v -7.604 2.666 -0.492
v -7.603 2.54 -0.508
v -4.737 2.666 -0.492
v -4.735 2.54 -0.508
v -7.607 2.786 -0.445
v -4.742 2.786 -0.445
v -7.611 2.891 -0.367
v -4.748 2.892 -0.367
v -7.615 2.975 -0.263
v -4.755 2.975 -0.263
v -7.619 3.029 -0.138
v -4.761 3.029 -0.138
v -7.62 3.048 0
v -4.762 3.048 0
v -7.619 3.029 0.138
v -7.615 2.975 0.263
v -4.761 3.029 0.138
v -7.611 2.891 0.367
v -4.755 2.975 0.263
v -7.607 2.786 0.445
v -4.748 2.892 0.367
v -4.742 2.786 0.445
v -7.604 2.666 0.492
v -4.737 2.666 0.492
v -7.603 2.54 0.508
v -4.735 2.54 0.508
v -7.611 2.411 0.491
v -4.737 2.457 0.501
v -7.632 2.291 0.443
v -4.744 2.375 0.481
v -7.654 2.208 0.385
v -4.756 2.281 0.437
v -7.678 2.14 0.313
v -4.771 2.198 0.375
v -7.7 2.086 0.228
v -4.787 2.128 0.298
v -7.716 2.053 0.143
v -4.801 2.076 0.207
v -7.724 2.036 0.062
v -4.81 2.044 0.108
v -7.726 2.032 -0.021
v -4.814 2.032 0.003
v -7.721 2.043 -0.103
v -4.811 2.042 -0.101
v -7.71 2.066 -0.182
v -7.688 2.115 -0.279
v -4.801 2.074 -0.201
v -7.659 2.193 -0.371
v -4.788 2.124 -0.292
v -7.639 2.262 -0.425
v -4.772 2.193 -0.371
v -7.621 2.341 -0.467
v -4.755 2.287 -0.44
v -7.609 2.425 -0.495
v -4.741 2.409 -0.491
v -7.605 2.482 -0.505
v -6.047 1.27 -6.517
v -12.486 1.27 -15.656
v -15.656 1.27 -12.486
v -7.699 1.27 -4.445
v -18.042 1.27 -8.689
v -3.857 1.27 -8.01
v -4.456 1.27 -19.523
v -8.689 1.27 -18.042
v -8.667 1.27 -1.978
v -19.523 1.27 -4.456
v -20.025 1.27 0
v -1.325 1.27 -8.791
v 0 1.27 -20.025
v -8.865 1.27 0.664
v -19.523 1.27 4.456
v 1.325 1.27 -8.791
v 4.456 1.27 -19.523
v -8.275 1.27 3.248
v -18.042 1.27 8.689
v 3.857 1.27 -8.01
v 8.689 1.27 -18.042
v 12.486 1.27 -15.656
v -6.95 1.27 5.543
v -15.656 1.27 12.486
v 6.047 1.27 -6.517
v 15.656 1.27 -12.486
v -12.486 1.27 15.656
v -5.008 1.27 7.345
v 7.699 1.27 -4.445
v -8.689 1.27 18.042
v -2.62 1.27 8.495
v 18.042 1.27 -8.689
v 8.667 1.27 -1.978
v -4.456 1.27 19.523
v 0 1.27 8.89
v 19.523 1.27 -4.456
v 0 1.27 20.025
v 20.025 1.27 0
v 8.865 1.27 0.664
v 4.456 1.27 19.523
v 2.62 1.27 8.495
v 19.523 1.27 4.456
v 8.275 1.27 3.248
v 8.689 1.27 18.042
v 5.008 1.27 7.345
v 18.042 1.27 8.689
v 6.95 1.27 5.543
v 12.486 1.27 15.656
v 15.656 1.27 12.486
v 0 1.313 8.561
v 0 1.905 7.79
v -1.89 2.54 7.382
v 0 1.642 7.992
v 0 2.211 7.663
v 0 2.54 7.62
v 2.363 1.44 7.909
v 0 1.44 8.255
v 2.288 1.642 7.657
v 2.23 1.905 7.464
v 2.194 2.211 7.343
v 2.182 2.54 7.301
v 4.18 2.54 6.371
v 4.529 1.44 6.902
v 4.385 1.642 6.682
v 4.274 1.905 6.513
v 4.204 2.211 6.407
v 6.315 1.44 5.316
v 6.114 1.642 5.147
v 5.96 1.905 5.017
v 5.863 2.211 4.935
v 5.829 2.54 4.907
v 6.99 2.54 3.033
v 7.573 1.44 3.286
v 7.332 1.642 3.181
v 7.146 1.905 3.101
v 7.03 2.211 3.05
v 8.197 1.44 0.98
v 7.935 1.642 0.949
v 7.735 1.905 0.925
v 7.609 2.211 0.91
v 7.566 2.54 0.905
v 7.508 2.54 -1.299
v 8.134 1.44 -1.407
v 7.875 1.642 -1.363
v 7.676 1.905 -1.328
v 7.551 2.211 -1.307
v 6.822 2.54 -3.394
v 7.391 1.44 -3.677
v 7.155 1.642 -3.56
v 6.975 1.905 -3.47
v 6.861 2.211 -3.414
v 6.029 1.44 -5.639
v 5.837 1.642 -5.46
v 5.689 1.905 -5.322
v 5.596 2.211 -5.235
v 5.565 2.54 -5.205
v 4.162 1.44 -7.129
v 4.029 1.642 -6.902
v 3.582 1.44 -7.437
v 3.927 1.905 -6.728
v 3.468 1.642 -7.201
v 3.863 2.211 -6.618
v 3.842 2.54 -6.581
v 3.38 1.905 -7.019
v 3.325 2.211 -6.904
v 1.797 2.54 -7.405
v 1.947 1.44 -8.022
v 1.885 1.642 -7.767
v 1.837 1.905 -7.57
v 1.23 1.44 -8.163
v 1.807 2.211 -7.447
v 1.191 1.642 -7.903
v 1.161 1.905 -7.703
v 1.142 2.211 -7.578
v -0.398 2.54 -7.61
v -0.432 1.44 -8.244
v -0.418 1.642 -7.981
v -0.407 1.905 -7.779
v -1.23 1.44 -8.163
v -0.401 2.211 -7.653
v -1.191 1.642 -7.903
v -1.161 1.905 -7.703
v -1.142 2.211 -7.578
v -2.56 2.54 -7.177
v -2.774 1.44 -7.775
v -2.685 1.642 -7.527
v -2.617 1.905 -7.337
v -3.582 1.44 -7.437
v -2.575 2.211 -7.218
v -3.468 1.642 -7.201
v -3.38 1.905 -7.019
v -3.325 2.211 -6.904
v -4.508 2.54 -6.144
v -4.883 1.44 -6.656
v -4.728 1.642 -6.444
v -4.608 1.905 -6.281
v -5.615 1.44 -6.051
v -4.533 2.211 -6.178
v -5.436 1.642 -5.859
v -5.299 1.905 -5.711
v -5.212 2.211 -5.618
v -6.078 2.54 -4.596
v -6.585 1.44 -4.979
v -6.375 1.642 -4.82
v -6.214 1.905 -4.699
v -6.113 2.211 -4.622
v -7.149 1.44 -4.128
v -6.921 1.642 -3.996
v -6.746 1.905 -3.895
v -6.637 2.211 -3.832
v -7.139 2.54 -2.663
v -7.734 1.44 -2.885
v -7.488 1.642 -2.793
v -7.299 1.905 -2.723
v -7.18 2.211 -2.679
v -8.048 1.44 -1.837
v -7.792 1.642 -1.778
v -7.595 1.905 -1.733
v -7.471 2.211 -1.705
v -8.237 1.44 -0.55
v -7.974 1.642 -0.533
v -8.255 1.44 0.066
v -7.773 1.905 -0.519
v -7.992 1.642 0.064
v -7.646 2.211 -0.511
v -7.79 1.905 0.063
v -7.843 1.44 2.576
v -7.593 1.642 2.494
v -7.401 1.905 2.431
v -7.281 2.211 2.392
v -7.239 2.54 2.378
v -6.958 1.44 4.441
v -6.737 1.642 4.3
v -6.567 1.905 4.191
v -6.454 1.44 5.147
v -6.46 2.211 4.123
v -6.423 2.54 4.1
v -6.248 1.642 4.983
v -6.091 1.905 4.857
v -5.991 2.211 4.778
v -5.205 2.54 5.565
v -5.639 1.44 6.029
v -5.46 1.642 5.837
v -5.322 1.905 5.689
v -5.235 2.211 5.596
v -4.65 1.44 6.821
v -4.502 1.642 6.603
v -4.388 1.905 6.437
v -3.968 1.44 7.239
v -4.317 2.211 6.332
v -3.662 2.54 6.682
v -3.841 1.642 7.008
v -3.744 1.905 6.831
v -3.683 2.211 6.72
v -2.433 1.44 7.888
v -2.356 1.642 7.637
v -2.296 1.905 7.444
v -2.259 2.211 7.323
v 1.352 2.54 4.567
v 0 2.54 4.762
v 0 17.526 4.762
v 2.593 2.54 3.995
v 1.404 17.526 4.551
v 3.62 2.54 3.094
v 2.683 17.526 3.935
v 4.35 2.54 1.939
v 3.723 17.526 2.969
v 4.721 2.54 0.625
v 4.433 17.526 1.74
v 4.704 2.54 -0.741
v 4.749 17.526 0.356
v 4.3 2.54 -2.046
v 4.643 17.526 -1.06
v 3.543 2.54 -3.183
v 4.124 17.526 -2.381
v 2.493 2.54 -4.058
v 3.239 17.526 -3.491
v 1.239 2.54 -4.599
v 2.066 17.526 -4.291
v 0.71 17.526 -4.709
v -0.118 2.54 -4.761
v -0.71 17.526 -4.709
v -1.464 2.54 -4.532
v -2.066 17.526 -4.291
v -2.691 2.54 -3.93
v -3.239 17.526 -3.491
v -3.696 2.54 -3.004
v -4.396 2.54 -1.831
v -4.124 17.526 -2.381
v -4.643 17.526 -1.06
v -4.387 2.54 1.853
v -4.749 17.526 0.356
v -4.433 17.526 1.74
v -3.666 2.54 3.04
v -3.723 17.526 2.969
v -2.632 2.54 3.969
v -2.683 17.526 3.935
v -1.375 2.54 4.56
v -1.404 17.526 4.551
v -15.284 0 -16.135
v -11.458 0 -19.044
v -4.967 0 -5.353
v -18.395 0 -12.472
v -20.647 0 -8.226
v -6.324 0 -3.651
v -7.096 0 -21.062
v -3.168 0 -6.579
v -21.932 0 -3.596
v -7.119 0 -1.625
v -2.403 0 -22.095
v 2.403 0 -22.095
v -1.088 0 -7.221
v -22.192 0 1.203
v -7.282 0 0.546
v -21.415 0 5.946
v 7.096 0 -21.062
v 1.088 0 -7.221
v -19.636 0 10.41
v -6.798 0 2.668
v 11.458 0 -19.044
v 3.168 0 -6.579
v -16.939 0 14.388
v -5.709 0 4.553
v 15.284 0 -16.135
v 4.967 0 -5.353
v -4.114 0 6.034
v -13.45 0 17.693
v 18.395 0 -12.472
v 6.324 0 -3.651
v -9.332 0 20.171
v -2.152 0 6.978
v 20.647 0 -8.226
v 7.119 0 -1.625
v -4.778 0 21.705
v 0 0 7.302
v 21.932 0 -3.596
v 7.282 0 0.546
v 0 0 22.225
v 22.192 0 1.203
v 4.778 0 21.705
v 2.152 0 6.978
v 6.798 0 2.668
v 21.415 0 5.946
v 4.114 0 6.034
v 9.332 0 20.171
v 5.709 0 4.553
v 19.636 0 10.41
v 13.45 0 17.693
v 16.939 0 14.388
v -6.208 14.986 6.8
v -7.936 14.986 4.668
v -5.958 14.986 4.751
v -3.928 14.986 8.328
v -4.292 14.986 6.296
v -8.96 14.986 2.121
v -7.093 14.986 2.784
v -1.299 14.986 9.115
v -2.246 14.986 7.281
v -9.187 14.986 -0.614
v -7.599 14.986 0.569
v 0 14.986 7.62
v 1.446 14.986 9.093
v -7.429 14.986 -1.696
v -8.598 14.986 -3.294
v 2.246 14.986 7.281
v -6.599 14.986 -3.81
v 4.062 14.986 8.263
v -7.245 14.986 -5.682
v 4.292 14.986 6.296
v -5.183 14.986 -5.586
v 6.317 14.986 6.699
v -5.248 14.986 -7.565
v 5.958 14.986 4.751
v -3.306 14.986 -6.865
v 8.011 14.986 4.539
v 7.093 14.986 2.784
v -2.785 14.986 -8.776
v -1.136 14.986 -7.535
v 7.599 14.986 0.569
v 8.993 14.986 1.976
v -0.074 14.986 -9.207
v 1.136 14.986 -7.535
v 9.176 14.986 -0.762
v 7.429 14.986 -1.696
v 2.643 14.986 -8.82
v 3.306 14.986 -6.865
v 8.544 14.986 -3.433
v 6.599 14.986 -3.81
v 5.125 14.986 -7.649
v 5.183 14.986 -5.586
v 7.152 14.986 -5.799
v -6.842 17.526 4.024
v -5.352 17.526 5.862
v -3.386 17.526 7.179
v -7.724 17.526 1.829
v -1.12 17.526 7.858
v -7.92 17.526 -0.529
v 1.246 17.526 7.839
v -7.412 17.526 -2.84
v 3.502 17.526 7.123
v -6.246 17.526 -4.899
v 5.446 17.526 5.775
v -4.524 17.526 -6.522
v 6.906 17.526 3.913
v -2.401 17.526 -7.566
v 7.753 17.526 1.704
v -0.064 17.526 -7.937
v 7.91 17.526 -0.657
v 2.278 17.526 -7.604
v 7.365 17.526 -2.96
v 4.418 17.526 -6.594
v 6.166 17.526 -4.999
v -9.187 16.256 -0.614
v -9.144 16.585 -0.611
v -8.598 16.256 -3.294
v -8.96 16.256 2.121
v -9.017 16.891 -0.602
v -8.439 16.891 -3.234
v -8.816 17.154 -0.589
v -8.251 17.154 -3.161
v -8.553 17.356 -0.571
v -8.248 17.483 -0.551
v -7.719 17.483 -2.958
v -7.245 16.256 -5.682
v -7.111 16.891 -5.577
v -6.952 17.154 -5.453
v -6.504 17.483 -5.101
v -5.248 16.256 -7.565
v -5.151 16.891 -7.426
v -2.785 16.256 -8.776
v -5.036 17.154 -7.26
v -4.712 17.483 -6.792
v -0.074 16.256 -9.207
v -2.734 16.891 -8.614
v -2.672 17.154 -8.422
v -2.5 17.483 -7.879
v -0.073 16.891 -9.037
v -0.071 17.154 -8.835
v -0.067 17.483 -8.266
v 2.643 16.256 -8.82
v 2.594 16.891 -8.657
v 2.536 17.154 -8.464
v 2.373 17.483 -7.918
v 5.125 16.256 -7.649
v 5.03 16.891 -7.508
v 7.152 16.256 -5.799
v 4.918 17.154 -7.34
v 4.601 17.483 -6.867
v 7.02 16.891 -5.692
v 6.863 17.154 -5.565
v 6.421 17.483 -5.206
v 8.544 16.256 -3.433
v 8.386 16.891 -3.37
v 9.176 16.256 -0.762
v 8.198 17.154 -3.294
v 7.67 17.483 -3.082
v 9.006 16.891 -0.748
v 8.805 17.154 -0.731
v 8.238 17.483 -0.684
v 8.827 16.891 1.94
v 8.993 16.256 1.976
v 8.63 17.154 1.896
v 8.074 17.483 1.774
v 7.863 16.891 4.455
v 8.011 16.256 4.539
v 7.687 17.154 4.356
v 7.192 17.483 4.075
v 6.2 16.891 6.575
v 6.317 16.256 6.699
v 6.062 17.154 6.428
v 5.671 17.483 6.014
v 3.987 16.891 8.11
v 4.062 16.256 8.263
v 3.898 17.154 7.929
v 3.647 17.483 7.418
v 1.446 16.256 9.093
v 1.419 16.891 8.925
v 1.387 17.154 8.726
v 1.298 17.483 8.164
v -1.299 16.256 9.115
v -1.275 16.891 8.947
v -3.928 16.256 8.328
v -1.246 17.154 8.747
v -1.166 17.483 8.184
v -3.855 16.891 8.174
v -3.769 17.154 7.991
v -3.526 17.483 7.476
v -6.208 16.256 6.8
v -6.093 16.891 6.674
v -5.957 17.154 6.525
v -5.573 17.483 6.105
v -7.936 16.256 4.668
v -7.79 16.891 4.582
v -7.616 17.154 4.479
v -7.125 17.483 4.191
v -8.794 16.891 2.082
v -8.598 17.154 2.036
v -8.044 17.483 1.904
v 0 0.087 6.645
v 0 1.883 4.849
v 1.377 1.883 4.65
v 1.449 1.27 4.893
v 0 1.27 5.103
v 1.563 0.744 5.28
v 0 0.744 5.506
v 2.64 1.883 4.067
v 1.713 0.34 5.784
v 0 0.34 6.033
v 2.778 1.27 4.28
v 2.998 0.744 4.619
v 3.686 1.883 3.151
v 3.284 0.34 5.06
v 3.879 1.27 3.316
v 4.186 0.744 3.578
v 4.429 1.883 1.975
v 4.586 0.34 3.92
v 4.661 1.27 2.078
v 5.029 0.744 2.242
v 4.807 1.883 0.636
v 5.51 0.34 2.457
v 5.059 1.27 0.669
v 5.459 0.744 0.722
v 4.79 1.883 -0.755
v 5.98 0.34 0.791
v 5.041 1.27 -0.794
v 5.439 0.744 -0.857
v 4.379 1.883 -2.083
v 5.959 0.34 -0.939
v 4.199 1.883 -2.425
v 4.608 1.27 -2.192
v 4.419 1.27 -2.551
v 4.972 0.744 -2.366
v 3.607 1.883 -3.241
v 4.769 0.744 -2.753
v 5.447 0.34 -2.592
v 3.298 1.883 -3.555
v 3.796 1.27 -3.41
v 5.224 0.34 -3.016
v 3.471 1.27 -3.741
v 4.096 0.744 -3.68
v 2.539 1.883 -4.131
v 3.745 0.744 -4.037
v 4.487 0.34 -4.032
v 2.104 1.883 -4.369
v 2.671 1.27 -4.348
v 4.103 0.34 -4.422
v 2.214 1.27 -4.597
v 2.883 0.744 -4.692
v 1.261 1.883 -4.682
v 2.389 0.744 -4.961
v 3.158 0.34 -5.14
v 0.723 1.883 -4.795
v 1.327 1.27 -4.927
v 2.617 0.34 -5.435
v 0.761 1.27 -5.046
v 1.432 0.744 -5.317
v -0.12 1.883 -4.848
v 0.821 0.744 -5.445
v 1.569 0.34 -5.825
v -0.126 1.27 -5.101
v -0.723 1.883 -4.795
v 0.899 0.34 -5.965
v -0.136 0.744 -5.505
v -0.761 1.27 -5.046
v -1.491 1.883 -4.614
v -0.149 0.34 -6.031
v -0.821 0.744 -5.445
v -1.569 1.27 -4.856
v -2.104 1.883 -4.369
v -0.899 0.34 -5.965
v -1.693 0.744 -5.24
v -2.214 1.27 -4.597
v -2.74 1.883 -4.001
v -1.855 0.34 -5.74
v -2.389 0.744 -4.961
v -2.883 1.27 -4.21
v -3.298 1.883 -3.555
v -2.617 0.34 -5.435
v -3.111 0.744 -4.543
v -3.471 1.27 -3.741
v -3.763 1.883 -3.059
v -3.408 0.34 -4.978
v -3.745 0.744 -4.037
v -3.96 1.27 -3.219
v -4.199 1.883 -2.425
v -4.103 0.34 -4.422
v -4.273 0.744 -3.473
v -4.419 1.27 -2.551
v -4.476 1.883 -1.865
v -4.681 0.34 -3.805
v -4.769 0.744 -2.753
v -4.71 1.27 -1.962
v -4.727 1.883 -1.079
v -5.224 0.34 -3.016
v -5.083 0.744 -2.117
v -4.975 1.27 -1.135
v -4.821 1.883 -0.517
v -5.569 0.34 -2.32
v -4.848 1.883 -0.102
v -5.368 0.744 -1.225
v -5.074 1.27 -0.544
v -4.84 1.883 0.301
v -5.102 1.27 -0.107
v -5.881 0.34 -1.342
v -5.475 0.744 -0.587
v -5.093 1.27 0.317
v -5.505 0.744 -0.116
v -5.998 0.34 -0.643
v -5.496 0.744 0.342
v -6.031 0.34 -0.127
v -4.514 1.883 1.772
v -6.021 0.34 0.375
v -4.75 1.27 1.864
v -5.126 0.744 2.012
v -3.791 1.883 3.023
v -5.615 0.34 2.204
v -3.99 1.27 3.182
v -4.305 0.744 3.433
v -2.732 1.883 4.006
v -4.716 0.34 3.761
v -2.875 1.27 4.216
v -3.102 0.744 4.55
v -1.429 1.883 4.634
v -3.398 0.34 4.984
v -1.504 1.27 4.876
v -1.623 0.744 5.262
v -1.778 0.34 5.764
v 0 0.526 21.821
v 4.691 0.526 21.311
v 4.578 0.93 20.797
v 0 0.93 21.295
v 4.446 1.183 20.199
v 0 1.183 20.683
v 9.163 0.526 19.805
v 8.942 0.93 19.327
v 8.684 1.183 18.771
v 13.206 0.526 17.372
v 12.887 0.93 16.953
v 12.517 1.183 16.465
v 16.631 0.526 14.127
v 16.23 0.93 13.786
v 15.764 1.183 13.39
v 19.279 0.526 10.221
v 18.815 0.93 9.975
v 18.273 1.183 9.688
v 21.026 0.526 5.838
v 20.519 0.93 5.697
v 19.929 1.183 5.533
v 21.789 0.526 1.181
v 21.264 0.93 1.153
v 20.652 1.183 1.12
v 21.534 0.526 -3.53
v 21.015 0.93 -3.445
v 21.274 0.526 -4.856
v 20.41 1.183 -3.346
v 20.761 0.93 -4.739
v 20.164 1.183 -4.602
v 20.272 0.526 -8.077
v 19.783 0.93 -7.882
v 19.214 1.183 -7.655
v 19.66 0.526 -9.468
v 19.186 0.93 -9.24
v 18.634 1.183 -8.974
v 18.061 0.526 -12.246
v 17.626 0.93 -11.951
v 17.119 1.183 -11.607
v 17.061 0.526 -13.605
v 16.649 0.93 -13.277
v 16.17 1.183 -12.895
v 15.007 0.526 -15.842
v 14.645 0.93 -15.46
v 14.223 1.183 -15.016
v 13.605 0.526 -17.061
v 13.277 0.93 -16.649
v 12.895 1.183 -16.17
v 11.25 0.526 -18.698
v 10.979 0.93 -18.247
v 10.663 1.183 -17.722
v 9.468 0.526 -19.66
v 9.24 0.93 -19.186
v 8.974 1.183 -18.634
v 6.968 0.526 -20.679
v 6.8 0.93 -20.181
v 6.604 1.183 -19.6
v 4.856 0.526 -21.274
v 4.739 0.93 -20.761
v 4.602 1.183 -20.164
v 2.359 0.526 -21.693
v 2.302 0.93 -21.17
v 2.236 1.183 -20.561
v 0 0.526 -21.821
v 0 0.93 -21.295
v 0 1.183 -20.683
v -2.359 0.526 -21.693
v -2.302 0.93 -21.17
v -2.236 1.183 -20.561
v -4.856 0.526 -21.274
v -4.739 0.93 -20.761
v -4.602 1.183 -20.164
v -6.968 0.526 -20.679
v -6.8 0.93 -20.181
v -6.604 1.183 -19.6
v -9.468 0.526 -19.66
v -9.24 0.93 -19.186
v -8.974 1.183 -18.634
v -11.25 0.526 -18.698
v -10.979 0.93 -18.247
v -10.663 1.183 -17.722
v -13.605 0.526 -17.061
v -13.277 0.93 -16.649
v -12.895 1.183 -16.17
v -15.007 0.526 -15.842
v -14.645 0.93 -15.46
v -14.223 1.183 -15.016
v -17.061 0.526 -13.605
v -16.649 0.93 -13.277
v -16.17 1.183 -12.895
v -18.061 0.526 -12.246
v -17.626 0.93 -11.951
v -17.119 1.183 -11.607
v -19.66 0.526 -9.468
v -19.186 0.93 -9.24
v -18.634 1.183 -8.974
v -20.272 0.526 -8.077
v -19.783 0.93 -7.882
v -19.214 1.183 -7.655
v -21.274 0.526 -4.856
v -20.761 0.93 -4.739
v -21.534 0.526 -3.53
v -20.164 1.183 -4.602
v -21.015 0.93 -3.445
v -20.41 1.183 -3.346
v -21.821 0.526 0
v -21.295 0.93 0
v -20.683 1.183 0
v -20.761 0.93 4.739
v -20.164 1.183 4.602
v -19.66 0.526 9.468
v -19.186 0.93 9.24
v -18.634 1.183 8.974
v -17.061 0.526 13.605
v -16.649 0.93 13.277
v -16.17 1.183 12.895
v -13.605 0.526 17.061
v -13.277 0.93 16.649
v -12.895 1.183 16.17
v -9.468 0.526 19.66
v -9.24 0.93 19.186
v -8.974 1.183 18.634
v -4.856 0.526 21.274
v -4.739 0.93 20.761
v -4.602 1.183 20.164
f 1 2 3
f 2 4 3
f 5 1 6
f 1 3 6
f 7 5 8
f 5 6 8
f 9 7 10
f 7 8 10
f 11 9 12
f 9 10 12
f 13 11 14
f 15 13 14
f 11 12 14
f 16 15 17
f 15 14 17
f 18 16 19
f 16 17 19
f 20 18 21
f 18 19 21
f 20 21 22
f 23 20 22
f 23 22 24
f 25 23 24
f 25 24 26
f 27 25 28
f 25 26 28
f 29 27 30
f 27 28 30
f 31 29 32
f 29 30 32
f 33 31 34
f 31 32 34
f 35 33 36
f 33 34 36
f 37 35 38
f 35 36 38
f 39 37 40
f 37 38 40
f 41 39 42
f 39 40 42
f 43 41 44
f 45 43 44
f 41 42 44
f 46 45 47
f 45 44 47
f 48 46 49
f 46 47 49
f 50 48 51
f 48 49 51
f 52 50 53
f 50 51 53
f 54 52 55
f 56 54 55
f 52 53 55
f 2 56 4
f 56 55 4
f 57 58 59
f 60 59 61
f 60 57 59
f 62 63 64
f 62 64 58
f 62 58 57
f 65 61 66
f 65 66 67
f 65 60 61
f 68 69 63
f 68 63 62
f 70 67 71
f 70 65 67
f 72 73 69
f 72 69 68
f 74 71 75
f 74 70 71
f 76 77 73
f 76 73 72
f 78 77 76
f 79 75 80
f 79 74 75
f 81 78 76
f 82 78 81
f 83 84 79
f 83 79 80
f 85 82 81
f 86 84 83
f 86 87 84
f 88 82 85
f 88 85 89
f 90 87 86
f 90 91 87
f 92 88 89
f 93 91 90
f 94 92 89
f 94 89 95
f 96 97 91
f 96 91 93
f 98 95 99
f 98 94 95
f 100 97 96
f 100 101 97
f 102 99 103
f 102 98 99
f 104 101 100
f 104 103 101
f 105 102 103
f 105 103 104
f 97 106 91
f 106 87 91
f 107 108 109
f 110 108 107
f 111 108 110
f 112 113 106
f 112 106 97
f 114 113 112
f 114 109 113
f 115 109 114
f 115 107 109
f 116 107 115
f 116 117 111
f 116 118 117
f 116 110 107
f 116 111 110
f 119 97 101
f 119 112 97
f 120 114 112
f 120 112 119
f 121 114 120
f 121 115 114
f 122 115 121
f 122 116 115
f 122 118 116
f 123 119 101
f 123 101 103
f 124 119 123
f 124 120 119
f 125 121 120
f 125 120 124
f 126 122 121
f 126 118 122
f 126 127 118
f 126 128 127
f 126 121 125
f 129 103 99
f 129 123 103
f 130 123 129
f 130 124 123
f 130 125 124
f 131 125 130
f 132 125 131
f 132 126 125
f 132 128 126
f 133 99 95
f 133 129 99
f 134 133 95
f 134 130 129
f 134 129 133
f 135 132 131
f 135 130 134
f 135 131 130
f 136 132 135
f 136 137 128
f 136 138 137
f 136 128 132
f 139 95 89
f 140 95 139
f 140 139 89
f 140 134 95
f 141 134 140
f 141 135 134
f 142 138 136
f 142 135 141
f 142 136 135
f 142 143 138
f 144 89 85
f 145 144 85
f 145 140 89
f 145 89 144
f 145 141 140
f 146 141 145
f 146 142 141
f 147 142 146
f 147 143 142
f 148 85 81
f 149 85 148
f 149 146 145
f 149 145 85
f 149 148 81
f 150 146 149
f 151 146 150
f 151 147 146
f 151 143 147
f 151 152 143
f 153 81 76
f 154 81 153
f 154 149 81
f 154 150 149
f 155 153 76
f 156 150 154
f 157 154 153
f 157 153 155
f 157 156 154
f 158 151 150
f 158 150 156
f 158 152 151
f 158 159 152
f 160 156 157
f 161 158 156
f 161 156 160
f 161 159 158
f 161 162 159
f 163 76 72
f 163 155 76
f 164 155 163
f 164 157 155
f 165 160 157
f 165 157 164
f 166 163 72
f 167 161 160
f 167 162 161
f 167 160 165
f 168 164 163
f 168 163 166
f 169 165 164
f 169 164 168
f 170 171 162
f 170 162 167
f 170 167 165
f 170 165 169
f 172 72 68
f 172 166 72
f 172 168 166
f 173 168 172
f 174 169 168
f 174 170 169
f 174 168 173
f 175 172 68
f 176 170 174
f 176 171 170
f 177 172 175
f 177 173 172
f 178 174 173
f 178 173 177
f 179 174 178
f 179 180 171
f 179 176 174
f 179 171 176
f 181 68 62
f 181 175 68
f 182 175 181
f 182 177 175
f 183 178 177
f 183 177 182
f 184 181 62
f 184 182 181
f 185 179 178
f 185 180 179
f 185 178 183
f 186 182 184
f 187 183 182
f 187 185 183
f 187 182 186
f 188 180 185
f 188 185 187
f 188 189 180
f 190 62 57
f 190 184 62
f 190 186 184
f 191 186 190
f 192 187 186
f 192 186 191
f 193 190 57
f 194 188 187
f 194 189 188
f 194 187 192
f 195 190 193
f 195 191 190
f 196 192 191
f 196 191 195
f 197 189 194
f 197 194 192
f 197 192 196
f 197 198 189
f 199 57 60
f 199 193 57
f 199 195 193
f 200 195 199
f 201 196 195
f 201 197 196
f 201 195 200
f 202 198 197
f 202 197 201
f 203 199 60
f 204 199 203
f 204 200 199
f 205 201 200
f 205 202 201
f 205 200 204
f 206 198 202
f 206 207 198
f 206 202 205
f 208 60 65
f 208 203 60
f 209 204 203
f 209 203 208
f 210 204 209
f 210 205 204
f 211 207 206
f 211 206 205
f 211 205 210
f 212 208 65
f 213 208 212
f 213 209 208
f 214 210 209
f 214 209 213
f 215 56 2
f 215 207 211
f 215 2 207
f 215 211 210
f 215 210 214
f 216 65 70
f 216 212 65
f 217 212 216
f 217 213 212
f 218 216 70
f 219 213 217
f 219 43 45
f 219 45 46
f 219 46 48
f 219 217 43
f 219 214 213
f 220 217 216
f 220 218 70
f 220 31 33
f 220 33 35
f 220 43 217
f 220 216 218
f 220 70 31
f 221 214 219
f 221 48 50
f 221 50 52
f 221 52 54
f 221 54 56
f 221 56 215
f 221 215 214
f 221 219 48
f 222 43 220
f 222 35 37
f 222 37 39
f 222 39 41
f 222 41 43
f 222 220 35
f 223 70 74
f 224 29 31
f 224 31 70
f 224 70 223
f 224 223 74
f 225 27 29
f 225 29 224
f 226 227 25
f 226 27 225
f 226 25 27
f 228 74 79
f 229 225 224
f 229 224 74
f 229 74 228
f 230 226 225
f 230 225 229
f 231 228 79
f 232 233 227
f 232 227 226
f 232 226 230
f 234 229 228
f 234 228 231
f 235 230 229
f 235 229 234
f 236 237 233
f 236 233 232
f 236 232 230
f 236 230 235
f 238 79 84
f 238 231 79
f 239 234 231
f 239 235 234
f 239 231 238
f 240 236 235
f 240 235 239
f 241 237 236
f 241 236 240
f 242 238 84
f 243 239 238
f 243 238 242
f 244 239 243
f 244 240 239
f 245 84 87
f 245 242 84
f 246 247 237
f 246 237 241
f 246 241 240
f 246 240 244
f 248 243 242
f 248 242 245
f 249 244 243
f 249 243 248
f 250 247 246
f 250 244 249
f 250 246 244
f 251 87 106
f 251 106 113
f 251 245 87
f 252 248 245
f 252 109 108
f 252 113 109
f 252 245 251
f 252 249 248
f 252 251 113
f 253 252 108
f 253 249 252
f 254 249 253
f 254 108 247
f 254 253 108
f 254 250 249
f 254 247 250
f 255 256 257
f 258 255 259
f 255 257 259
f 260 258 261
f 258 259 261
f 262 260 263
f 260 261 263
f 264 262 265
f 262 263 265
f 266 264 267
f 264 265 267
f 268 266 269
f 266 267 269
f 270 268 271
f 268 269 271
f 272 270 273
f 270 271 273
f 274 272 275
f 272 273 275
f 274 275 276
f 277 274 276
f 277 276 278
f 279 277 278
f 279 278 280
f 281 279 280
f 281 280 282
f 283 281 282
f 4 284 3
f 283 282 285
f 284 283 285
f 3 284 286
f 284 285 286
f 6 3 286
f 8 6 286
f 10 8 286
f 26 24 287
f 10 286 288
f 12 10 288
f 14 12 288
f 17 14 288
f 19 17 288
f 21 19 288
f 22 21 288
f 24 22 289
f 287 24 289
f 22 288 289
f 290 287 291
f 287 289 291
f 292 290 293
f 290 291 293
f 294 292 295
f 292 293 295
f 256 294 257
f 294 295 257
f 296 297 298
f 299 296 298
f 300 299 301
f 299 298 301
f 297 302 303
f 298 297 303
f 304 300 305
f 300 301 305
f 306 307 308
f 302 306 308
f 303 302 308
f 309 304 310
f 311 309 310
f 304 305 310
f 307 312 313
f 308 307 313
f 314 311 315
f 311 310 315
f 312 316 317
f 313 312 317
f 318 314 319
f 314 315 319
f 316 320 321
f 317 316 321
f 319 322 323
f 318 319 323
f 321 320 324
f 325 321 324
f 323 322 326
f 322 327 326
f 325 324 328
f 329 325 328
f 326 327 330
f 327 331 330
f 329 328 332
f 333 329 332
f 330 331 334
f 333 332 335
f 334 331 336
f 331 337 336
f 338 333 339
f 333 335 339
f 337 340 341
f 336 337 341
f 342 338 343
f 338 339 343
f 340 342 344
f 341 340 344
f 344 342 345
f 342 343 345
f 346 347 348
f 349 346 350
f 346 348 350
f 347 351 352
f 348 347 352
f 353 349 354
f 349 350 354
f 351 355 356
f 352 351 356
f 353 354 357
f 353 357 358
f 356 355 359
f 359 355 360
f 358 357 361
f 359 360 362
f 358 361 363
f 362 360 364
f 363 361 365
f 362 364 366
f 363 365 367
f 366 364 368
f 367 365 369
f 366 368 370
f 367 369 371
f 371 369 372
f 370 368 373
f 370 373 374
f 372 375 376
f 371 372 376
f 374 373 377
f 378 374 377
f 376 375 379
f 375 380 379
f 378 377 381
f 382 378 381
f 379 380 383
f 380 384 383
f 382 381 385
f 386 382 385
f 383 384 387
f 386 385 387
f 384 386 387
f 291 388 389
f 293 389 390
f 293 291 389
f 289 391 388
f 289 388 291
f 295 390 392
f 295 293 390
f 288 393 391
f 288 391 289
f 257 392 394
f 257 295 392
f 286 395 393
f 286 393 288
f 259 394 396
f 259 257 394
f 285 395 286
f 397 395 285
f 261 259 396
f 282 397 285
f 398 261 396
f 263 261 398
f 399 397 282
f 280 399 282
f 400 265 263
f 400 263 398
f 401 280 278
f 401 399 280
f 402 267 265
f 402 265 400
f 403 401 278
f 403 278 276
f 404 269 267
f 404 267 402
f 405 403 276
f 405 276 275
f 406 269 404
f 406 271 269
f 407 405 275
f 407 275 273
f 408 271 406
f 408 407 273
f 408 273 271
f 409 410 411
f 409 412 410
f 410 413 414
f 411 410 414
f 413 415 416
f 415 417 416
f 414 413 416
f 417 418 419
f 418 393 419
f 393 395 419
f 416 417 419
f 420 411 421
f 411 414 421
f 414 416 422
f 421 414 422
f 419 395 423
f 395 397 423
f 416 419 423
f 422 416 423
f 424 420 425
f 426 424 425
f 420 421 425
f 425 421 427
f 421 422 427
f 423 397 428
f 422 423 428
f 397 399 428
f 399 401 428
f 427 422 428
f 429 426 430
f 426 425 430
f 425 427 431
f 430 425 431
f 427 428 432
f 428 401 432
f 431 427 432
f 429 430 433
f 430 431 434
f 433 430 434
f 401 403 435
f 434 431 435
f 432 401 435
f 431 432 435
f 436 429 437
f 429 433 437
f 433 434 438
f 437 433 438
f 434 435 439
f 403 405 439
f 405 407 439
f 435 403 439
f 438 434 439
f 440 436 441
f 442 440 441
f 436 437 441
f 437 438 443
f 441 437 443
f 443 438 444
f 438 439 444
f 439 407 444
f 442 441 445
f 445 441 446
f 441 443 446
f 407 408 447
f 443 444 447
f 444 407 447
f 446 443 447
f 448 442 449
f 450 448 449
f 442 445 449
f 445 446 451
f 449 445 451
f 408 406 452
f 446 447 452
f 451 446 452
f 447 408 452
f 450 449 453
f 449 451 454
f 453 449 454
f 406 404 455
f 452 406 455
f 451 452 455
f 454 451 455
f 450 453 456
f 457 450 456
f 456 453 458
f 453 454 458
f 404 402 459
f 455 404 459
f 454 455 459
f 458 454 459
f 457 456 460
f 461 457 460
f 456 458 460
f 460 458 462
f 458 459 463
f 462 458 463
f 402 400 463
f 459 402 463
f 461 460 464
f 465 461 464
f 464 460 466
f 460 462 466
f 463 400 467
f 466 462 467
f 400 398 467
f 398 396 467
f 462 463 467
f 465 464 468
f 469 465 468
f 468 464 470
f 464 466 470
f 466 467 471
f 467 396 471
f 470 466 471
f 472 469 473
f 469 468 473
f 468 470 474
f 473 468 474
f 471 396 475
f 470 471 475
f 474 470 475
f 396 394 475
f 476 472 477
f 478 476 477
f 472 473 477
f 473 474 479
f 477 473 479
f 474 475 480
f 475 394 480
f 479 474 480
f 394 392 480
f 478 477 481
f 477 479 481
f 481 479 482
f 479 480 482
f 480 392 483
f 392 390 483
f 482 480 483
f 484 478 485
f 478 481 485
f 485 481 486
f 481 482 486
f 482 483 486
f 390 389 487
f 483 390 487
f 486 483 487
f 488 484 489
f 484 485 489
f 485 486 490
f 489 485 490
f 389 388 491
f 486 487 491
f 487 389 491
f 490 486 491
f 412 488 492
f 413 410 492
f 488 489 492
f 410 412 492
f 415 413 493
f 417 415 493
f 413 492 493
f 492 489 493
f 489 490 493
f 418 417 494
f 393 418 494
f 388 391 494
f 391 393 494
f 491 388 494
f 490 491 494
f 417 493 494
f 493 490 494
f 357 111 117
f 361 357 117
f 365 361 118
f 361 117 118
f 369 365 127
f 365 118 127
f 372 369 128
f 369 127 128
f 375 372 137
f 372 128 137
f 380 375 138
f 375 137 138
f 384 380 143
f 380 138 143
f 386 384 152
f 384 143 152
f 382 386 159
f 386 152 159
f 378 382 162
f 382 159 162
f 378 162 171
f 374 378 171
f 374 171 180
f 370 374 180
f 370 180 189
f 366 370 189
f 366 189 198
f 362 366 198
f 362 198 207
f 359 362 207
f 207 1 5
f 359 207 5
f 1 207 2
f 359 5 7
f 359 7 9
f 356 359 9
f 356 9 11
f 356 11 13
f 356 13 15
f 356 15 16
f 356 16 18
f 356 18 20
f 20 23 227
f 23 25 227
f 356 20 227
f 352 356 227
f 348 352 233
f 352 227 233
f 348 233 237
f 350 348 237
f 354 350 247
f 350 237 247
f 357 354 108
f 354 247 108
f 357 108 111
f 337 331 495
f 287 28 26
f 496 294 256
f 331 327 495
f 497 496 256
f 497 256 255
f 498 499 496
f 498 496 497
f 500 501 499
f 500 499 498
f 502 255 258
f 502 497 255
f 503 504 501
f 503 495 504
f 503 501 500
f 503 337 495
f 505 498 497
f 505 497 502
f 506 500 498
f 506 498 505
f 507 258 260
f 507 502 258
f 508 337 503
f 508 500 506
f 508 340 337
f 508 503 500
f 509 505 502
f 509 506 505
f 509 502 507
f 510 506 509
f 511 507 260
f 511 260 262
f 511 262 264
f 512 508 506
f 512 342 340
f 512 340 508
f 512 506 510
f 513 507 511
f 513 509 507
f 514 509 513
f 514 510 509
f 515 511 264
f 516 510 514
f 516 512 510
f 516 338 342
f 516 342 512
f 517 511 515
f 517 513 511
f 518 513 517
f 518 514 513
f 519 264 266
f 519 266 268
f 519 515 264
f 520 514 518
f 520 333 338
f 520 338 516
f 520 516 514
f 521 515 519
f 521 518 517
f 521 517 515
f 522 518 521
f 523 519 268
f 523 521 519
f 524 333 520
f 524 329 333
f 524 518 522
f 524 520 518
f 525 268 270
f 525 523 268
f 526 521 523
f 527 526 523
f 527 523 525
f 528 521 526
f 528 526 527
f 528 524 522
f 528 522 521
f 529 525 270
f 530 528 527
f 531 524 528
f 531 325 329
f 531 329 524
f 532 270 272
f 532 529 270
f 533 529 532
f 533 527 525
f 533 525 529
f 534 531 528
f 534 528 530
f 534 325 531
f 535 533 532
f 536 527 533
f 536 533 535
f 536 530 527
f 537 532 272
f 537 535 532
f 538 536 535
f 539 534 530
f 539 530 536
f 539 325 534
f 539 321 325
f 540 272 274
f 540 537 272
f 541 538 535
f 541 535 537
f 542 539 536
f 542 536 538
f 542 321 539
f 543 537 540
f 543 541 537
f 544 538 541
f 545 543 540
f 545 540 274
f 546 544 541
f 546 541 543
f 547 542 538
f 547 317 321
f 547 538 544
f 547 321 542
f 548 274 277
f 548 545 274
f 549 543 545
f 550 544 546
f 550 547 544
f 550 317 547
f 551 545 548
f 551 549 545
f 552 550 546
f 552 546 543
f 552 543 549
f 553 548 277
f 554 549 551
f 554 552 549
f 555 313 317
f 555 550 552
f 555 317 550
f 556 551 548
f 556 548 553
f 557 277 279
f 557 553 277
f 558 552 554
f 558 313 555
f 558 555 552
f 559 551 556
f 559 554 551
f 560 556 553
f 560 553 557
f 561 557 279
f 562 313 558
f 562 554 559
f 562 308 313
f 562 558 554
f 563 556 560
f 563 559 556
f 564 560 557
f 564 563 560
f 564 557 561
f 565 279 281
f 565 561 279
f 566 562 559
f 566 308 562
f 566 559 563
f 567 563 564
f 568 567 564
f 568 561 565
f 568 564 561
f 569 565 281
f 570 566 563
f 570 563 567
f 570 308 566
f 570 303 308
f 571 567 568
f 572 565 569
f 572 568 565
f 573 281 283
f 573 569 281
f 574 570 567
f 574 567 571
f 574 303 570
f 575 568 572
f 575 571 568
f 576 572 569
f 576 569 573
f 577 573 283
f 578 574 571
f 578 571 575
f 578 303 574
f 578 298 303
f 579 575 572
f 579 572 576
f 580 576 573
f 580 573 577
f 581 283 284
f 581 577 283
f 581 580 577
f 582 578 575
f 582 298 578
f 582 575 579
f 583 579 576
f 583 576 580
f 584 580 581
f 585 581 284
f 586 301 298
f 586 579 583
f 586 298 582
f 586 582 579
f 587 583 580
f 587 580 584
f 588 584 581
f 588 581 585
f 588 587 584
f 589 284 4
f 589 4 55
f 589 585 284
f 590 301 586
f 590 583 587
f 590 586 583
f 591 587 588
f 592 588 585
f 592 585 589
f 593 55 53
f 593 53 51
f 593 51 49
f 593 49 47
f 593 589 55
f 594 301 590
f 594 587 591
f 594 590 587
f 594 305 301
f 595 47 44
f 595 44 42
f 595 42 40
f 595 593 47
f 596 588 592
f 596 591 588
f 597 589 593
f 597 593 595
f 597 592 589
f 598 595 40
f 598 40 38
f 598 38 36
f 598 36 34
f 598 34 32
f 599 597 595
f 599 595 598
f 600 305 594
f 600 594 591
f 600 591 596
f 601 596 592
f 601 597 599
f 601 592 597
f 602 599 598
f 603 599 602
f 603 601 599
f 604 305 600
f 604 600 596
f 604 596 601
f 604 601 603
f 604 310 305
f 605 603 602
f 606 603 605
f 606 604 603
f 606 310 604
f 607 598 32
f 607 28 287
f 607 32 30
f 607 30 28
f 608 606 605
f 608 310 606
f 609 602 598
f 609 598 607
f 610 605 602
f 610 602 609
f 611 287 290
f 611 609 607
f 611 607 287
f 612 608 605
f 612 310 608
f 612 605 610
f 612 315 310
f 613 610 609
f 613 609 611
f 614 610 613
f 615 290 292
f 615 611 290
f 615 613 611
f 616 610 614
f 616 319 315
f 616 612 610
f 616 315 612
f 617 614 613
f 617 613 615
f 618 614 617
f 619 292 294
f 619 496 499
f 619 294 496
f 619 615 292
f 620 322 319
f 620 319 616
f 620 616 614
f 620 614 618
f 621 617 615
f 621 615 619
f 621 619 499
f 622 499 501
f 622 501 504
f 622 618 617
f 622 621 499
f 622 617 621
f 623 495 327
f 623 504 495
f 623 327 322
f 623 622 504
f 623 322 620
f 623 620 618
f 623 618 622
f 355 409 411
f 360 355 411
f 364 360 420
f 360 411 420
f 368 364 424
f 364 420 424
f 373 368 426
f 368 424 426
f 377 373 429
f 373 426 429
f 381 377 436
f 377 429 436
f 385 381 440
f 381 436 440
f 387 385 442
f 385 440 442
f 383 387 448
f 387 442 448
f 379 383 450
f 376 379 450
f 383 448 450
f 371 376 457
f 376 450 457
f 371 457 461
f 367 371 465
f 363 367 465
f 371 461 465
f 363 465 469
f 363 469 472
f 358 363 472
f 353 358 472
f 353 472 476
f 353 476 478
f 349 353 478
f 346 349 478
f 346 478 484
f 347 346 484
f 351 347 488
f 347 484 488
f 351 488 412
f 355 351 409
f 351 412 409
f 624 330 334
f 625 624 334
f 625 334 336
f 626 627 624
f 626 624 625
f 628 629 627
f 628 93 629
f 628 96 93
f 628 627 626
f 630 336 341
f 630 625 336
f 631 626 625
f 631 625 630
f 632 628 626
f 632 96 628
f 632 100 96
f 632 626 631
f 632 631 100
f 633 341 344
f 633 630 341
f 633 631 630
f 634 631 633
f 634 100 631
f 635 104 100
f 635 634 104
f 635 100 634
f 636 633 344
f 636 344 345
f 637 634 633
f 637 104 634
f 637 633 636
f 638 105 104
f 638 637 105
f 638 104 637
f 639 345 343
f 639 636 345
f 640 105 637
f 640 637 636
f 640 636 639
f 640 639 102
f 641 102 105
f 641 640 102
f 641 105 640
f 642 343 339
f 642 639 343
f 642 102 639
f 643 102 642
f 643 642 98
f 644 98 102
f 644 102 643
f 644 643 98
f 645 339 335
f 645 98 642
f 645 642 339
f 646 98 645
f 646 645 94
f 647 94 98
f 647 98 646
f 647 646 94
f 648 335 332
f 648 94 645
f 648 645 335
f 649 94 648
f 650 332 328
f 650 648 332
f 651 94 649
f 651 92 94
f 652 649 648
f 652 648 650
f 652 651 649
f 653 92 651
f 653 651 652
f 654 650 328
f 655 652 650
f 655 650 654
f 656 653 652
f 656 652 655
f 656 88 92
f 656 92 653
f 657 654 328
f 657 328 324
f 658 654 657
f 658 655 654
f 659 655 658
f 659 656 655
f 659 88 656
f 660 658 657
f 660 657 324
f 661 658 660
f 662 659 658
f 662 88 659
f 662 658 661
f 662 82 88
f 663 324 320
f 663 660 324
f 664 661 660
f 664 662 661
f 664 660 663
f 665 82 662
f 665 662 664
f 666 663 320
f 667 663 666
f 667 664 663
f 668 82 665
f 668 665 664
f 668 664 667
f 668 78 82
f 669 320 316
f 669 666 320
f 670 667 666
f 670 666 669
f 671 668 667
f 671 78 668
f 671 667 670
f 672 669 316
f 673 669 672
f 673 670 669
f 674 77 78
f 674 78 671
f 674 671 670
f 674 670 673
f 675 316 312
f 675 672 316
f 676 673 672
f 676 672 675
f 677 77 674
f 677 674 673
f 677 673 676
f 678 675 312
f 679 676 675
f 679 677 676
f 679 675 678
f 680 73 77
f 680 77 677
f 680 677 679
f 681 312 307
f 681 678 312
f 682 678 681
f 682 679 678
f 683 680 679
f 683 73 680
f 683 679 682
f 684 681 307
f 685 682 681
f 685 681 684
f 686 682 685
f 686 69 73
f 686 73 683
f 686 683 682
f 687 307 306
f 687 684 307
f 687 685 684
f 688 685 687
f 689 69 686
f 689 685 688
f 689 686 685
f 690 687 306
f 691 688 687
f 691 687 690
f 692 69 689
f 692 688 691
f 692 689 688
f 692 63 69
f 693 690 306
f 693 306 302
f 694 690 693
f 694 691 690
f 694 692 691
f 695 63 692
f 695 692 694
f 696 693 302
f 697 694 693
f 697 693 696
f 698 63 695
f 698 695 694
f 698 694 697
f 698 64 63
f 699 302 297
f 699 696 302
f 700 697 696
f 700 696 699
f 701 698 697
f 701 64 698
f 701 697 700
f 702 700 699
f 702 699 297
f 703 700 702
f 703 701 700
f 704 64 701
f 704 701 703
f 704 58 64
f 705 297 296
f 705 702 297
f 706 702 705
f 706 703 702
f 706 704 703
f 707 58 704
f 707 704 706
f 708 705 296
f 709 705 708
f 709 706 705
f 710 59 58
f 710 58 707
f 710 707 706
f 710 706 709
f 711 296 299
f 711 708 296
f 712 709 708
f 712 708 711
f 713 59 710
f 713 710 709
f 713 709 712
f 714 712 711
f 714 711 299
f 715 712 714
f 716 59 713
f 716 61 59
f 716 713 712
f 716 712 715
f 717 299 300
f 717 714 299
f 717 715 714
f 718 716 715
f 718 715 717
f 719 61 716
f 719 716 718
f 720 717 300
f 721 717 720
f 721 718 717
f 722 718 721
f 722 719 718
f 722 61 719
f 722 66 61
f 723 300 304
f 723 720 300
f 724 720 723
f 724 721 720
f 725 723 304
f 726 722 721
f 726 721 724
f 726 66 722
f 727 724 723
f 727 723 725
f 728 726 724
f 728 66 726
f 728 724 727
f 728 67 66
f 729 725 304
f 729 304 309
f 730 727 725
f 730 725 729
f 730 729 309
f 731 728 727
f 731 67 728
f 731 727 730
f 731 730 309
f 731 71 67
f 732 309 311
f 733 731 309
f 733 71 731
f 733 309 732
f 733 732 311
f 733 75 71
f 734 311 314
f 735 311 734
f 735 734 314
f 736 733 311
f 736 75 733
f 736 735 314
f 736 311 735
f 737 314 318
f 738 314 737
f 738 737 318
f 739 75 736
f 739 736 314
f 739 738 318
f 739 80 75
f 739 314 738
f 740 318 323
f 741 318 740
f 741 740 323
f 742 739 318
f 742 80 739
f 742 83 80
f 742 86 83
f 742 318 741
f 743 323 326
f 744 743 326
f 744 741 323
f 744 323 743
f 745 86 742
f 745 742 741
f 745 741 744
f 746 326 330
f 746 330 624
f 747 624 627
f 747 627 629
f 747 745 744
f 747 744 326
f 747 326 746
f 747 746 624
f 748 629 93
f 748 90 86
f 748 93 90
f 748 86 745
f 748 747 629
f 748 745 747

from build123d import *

# Parameters (mm, degrees)
SKETCH1_R           = 22.225
BOSS_EXTRUDE1_DEPTH = 1.27
SKETCH2_R           = 7.62
BOSS_EXTRUDE2_DEPTH = 16.256
SKETCH3_R           = 4.7625
CUT_EXTRUDE1_DEPTH  = 36.986968836
FILLET1_R           = 1.27
SKETCH4_R           = 0.508
CUT_EXTRUDE2_DEPTH  = 36.986968836
FILLET2_R           = 2.54
FILLET3_R           = 2.54
SKETCH5_W           = 1.5875
SKETCH5_H           = 2.54
FILLET4_R           = 1.27


with BuildPart() as part:
    # Sketch1 → Boss-Extrude1 (new body)
    with BuildSketch(Plane(origin=(0, 0, 0), x_dir=(1, 0, 0), z_dir=(0, 1, 0))):
        with Locations(Location((0, 0, 0), (0, 0, 270))):
            Circle(SKETCH1_R)
    extrude(amount=BOSS_EXTRUDE1_DEPTH)

    # Sketch2 → Boss-Extrude2 (add)
    with BuildSketch(Plane(origin=(0, 1.27, 0), x_dir=(1, 0, 0), z_dir=(0, 1, 0))):
        with Locations(Location((0, 0, 0), (0, 0, 270))):
            Circle(SKETCH2_R)
    extrude(amount=BOSS_EXTRUDE2_DEPTH)

    # Sketch3 → Cut-Extrude1 (cut, through all)
    with BuildSketch(Plane(origin=(0, 17.526, 0), x_dir=(1, 0, 0), z_dir=(0, 1, 0))):
        with Locations(Location((0, 0, 0), (0, 0, 270))):
            Circle(SKETCH3_R)
    extrude(amount=-CUT_EXTRUDE1_DEPTH, mode=Mode.SUBTRACT)

    # Fillet1
    fillet1_edges = [part.edges().sort_by_distance(p)[0] for p in [
        (0, 1.27, -7.62),
    ]]
    fillet(fillet1_edges, radius=FILLET1_R)

    # Sketch4 → Cut-Extrude2 (cut, through all)
    with BuildSketch(Plane(origin=(0, 0, 0), x_dir=(0, 0, -1), z_dir=(1, 0, 0))):
        with Locations((0, 2.54)):
            Circle(SKETCH4_R)
    extrude(amount=-CUT_EXTRUDE2_DEPTH, mode=Mode.SUBTRACT)

    # Fillet2
    # the kernel refuses this fillet: 2.54 mm, written as the material it takes off along each edge
    with BuildSketch(Plane(origin=(0, 1.27, 0), x_dir=(0, 0, 1), z_dir=(-1, 0, 0))) as fillet2_piece_1:
        with BuildLine():
            CenterArc((20.025295474, -2.54), FILLET2_R, 30, 60)
            Line((22.225, -1.27), (22.268994091, -1.2446))
            ThreePointArc((22.268994091, -1.2446), (22.2758, -0.635), (22.2758, 0))
            Line((22.2758, 0), (22.225, 0.0508))
            Line((22.225, 0.0508), (20.025295474, 0.0508))
            Line((20.025295474, 0.0508), (20.025295474, 0))
        make_face()
    revolve(axis=Axis((0, 1.27, 0), (0, 1, 0)), mode=Mode.SUBTRACT)

    # Fillet3
    # the kernel refuses this fillet: 2.54 mm, written as the material it takes off along each edge
    with BuildSketch(Plane(origin=(0, 0, 0), x_dir=(0, 0, 1), z_dir=(-1, 0, 0))) as fillet3_piece_1:
        with BuildLine():
            CenterArc((4.7625 + FILLET3_R, FILLET3_R), FILLET3_R, 180, 90)
            Line((4.7625, FILLET3_R), (4.7625, 0))
            Line((4.7625, 0), (4.7625 + FILLET3_R, 0))
        make_face()
    revolve(axis=Axis((0, 0, 0), (0, 1, 0)), mode=Mode.SUBTRACT)

    # Sketch5 → Revolve1 (revolve)
    with BuildSketch(Plane.XY, mode=Mode.PRIVATE) as revolve1_sk:
        with Locations((8.41375, 16.256)):
            Rectangle(SKETCH5_W, SKETCH5_H)
    revolve(revolve1_sk.sketch.rotate(Axis((0, 19.916609625, 0), (0, -1, 0)), 183.822553729), axis=Axis((0, 19.916609625, 0), (0, -1, 0)))

    # Fillet4
    fillet4_edges = [part.edges().sort_by_distance(p)[0] for p in [
        (9.187016104, 17.526, 0.613833333),
    ]]
    fillet(fillet4_edges, radius=FILLET4_R)


solid = part.part
